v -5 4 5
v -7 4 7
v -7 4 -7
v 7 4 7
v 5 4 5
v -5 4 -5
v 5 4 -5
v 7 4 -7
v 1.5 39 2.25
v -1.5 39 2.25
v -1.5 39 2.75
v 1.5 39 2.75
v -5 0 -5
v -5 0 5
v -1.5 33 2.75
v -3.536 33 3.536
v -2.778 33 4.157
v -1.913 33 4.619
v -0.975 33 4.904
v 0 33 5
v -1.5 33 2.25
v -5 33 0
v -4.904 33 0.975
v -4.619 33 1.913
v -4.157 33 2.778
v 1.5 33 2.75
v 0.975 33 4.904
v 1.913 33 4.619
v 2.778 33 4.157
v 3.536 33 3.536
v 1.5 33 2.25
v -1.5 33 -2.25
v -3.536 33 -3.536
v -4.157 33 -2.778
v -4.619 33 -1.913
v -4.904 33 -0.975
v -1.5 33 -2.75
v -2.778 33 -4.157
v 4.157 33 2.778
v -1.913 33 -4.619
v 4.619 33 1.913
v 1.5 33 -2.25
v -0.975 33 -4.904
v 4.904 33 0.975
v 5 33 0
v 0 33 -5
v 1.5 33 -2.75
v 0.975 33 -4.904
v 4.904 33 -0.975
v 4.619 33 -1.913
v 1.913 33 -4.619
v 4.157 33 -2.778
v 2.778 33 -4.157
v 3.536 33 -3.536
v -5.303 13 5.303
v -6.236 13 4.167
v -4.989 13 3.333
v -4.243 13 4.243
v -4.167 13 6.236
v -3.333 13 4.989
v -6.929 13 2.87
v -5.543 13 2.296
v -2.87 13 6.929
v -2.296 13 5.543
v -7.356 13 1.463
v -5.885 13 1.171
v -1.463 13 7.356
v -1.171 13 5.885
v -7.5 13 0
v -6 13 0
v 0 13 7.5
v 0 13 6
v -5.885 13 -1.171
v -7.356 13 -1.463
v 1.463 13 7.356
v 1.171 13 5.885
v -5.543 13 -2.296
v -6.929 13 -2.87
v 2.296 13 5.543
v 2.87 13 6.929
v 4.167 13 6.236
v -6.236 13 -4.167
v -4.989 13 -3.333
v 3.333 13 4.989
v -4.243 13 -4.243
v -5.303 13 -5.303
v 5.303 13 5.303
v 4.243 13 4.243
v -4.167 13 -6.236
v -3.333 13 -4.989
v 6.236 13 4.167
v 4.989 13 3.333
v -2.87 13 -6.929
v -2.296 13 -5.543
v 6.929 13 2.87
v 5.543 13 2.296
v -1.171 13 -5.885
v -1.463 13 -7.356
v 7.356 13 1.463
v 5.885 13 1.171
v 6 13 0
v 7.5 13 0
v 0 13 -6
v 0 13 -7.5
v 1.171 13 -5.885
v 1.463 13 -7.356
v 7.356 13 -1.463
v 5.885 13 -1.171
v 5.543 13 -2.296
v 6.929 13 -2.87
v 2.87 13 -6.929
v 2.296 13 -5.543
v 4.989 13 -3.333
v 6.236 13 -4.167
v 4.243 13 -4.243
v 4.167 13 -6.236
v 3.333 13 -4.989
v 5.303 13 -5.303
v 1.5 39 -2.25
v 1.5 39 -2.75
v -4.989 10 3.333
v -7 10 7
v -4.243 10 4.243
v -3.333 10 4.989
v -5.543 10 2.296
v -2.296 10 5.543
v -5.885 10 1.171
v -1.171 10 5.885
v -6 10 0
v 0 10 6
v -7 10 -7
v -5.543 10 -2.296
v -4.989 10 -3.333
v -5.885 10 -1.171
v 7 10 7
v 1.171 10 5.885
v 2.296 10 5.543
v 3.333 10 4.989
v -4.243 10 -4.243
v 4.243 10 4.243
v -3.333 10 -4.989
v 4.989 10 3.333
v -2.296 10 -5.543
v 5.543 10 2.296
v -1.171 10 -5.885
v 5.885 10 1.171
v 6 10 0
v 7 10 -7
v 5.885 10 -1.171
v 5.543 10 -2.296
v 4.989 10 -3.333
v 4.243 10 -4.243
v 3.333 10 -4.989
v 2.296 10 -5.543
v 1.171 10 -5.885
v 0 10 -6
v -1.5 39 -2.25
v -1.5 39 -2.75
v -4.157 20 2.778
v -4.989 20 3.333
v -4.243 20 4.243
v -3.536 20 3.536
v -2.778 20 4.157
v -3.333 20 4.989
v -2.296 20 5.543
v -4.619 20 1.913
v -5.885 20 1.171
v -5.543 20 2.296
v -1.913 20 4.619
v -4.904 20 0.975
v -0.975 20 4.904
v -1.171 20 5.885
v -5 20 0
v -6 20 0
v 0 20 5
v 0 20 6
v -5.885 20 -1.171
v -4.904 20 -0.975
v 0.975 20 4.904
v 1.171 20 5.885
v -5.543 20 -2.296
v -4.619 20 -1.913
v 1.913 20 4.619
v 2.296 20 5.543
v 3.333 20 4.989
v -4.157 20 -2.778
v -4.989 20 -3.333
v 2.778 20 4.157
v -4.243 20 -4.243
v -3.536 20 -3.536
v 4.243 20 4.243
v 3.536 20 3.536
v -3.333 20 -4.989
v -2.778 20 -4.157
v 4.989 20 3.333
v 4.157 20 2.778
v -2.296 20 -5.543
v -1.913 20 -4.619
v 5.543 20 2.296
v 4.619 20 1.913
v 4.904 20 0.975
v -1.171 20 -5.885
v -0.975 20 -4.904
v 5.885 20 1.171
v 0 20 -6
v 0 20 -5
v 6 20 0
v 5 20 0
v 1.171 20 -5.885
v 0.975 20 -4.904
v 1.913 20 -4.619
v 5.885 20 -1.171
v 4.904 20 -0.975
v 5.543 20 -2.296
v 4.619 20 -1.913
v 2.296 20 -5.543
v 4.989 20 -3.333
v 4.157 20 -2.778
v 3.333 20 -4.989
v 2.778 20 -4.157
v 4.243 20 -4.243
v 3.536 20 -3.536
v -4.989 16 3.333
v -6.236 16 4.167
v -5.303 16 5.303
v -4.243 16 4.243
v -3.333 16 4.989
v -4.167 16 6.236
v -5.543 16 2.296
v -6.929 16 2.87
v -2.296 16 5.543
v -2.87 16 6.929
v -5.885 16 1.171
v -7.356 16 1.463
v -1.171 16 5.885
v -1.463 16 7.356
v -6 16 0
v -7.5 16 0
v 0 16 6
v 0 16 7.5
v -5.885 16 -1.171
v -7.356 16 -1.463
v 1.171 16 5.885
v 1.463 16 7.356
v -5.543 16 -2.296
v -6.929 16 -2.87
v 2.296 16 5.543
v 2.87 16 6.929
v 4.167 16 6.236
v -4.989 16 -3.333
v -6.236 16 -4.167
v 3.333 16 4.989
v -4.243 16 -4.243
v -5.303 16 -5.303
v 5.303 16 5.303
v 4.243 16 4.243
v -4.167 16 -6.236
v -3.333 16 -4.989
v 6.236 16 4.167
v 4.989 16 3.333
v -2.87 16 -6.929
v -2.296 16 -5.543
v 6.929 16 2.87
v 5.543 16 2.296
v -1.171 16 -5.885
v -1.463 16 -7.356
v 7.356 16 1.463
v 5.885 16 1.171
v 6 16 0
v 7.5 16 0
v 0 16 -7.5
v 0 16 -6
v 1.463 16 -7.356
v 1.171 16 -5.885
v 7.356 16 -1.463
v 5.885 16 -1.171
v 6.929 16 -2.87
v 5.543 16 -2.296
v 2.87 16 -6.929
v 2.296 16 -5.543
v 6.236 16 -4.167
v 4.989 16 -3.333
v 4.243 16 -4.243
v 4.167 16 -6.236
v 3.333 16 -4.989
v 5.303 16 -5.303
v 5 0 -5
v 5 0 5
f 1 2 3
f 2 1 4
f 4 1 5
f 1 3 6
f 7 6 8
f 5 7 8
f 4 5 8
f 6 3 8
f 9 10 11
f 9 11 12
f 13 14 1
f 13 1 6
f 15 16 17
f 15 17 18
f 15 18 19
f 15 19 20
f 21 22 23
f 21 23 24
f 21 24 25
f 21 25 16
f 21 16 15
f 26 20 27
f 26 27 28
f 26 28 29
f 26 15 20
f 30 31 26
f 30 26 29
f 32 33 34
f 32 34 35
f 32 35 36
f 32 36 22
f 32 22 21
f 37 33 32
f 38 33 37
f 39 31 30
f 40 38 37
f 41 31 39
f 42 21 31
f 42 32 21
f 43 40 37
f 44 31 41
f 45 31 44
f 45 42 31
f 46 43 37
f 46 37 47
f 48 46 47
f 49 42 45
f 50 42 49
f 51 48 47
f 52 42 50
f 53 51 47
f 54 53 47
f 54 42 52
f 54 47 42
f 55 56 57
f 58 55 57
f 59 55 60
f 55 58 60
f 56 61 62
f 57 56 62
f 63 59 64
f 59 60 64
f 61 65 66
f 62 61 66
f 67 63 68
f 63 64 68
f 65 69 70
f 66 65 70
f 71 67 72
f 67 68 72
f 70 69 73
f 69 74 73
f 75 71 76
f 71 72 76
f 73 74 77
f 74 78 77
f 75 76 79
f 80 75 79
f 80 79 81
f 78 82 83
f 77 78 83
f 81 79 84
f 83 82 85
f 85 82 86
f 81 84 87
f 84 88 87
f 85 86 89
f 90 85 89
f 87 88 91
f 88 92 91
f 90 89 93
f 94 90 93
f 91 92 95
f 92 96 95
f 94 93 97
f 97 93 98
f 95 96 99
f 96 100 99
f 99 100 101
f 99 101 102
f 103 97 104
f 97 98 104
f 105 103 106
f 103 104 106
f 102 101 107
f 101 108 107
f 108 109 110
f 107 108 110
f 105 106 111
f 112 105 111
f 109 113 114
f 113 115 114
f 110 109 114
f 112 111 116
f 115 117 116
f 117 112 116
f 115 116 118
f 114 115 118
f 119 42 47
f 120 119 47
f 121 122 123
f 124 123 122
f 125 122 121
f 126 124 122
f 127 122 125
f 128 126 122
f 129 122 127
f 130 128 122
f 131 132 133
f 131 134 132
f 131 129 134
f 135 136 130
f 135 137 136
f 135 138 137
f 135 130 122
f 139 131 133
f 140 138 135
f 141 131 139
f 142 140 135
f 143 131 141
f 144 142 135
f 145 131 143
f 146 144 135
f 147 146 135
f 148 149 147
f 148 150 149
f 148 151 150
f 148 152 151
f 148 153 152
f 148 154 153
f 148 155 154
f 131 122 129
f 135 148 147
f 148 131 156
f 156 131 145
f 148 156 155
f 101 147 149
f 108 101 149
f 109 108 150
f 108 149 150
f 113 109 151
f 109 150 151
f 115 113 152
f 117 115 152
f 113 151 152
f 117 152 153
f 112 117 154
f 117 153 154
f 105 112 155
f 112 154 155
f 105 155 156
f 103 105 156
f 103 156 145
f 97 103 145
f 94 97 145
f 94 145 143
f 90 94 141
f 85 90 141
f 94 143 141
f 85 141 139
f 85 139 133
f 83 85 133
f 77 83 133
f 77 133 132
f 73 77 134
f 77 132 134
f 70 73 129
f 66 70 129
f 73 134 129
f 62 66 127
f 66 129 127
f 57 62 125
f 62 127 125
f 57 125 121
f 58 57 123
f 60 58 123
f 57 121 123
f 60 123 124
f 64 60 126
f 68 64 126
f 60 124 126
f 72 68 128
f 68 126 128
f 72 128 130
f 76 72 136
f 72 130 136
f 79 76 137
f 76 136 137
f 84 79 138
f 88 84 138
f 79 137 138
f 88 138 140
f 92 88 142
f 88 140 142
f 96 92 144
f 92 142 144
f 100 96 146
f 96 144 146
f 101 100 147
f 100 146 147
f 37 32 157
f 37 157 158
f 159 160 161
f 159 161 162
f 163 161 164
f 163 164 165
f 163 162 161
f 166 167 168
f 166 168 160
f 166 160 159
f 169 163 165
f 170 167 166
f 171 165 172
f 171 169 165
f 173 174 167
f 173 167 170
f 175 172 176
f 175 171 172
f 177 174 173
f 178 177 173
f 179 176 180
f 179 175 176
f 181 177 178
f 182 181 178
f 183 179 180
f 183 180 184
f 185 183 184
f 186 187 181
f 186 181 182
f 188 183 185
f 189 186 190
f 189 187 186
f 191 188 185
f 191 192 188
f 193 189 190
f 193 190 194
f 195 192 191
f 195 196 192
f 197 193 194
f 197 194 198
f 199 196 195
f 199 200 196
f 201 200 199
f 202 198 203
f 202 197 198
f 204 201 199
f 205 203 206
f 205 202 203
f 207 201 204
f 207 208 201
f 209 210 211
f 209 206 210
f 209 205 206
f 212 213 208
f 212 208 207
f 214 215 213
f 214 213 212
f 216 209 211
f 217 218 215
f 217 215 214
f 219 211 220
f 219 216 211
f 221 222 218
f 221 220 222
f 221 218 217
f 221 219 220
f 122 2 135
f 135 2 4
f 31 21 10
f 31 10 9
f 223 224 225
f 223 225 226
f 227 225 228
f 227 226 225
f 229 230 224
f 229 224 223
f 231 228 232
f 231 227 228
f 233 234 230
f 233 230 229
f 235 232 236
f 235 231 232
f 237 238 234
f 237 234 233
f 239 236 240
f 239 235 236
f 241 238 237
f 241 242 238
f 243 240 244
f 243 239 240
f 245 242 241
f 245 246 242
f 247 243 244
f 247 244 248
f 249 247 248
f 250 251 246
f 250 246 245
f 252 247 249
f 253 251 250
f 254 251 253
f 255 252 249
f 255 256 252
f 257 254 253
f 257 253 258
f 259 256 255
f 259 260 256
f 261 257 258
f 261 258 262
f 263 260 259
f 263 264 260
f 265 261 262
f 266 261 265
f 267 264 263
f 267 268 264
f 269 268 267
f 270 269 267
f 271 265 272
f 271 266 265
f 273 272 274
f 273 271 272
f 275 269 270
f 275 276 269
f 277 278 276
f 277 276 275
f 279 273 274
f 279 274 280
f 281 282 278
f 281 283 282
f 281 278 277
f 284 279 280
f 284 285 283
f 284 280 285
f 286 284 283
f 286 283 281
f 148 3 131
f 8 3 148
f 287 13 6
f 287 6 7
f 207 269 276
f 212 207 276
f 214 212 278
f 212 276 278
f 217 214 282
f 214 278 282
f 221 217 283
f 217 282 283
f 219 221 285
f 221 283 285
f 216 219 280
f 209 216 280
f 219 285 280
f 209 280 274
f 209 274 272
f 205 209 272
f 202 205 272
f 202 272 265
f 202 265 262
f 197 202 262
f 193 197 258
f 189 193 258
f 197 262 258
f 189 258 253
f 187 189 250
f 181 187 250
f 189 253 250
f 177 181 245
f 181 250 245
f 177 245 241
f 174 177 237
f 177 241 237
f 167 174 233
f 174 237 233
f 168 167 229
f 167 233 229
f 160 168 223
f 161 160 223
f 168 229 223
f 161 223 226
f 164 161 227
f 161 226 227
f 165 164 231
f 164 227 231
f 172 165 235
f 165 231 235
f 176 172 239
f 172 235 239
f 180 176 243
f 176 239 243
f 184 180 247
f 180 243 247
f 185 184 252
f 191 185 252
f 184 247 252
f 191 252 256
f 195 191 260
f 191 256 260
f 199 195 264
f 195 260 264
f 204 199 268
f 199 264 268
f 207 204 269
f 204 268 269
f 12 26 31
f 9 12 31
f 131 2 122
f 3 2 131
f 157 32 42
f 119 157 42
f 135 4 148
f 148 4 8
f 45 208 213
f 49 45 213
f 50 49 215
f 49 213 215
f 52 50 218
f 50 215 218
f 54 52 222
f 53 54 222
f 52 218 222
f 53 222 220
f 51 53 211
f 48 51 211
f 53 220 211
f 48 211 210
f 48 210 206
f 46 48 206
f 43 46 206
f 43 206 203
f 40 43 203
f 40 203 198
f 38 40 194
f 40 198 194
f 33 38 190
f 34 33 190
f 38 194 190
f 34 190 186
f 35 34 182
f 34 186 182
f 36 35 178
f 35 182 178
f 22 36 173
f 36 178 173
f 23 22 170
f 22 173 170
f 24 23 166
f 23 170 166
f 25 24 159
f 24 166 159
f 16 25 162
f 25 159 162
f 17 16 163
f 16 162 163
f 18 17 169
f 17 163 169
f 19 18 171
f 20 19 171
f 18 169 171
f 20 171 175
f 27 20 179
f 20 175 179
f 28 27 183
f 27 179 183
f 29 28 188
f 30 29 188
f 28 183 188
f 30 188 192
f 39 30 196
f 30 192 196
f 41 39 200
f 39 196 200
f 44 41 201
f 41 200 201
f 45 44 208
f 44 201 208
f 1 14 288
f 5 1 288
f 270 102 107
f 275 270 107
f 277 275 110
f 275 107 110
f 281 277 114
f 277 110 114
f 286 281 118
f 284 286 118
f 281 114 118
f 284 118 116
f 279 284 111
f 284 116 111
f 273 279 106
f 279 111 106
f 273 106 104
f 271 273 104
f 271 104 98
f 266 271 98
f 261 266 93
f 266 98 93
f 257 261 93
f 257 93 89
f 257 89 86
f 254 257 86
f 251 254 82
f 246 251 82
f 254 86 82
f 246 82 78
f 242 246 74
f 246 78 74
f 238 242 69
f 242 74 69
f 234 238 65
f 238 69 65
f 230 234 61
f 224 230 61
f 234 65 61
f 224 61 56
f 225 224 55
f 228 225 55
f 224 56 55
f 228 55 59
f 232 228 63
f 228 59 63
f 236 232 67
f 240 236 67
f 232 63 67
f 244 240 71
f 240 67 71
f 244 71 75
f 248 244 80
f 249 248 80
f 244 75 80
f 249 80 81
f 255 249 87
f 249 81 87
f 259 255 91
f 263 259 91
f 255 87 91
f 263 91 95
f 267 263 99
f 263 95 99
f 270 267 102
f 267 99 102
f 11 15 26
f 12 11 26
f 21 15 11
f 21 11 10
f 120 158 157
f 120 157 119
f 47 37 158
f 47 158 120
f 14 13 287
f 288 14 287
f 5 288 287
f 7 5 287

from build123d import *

# Parameters (mm, degrees)
SKETCH1_W           = 10
SKETCH1_H           = 10
BOSS_EXTRUDE1_DEPTH = 4
SKETCH2_W           = 14
SKETCH2_H           = 14
BOSS_EXTRUDE2_DEPTH = 6
SKETCH3_R           = 6
BOSS_EXTRUDE3_DEPTH = 3
SKETCH4_R           = 7.5
BOSS_EXTRUDE4_DEPTH = 3
SKETCH5_R           = 6
BOSS_EXTRUDE5_DEPTH = 4
SKETCH6_R           = 5
BOSS_EXTRUDE6_DEPTH = 13
SKETCH7_W           = 3
SKETCH7_H           = 0.5
BOSS_EXTRUDE7_DEPTH = 6


with BuildPart() as part:
    # Sketch1 → Boss-Extrude1 (new body)
    with BuildSketch(Plane(origin=(0, 0, 0), x_dir=(1, 0, 0), z_dir=(0, 1, 0))):
        Rectangle(SKETCH1_W, SKETCH1_H)
    extrude(amount=BOSS_EXTRUDE1_DEPTH)

    # Sketch2 → Boss-Extrude2 (add)
    with BuildSketch(Plane(origin=(0, 4, 0), x_dir=(1, 0, 0), z_dir=(0, 1, 0))):
        Rectangle(SKETCH2_W, SKETCH2_H)
    extrude(amount=BOSS_EXTRUDE2_DEPTH)

    # Sketch3 → Boss-Extrude3 (add)
    with BuildSketch(Plane(origin=(0, 10, 0), x_dir=(1, 0, 0), z_dir=(0, 1, 0))):
        Circle(SKETCH3_R)
    extrude(amount=BOSS_EXTRUDE3_DEPTH)

    # Sketch4 → Boss-Extrude4 (add)
    with BuildSketch(Plane(origin=(0, 13, 0), x_dir=(1, 0, 0), z_dir=(0, 1, 0))):
        Circle(SKETCH4_R)
    extrude(amount=BOSS_EXTRUDE4_DEPTH)

    # Sketch5 → Boss-Extrude5 (add)
    with BuildSketch(Plane(origin=(0, 16, 0), x_dir=(1, 0, 0), z_dir=(0, 1, 0))):
        Circle(SKETCH5_R)
    extrude(amount=BOSS_EXTRUDE5_DEPTH)

    # Sketch6 → Boss-Extrude6 (add)
    with BuildSketch(Plane(origin=(0, 20, 0), x_dir=(1, 0, 0), z_dir=(0, 1, 0))):
        Circle(SKETCH6_R)
    extrude(amount=BOSS_EXTRUDE6_DEPTH)

    # Sketch7 → Boss-Extrude7 (add)
    with BuildSketch(Plane(origin=(0, 33, 0), x_dir=(1, 0, 0), z_dir=(0, 1, 0))):
        with Locations((0, -2.5)):
            Rectangle(SKETCH7_W, SKETCH7_H)
        with Locations((0, 2.5)):
            Rectangle(SKETCH7_W, SKETCH7_H)
    extrude(amount=BOSS_EXTRUDE7_DEPTH)


solid = part.part
